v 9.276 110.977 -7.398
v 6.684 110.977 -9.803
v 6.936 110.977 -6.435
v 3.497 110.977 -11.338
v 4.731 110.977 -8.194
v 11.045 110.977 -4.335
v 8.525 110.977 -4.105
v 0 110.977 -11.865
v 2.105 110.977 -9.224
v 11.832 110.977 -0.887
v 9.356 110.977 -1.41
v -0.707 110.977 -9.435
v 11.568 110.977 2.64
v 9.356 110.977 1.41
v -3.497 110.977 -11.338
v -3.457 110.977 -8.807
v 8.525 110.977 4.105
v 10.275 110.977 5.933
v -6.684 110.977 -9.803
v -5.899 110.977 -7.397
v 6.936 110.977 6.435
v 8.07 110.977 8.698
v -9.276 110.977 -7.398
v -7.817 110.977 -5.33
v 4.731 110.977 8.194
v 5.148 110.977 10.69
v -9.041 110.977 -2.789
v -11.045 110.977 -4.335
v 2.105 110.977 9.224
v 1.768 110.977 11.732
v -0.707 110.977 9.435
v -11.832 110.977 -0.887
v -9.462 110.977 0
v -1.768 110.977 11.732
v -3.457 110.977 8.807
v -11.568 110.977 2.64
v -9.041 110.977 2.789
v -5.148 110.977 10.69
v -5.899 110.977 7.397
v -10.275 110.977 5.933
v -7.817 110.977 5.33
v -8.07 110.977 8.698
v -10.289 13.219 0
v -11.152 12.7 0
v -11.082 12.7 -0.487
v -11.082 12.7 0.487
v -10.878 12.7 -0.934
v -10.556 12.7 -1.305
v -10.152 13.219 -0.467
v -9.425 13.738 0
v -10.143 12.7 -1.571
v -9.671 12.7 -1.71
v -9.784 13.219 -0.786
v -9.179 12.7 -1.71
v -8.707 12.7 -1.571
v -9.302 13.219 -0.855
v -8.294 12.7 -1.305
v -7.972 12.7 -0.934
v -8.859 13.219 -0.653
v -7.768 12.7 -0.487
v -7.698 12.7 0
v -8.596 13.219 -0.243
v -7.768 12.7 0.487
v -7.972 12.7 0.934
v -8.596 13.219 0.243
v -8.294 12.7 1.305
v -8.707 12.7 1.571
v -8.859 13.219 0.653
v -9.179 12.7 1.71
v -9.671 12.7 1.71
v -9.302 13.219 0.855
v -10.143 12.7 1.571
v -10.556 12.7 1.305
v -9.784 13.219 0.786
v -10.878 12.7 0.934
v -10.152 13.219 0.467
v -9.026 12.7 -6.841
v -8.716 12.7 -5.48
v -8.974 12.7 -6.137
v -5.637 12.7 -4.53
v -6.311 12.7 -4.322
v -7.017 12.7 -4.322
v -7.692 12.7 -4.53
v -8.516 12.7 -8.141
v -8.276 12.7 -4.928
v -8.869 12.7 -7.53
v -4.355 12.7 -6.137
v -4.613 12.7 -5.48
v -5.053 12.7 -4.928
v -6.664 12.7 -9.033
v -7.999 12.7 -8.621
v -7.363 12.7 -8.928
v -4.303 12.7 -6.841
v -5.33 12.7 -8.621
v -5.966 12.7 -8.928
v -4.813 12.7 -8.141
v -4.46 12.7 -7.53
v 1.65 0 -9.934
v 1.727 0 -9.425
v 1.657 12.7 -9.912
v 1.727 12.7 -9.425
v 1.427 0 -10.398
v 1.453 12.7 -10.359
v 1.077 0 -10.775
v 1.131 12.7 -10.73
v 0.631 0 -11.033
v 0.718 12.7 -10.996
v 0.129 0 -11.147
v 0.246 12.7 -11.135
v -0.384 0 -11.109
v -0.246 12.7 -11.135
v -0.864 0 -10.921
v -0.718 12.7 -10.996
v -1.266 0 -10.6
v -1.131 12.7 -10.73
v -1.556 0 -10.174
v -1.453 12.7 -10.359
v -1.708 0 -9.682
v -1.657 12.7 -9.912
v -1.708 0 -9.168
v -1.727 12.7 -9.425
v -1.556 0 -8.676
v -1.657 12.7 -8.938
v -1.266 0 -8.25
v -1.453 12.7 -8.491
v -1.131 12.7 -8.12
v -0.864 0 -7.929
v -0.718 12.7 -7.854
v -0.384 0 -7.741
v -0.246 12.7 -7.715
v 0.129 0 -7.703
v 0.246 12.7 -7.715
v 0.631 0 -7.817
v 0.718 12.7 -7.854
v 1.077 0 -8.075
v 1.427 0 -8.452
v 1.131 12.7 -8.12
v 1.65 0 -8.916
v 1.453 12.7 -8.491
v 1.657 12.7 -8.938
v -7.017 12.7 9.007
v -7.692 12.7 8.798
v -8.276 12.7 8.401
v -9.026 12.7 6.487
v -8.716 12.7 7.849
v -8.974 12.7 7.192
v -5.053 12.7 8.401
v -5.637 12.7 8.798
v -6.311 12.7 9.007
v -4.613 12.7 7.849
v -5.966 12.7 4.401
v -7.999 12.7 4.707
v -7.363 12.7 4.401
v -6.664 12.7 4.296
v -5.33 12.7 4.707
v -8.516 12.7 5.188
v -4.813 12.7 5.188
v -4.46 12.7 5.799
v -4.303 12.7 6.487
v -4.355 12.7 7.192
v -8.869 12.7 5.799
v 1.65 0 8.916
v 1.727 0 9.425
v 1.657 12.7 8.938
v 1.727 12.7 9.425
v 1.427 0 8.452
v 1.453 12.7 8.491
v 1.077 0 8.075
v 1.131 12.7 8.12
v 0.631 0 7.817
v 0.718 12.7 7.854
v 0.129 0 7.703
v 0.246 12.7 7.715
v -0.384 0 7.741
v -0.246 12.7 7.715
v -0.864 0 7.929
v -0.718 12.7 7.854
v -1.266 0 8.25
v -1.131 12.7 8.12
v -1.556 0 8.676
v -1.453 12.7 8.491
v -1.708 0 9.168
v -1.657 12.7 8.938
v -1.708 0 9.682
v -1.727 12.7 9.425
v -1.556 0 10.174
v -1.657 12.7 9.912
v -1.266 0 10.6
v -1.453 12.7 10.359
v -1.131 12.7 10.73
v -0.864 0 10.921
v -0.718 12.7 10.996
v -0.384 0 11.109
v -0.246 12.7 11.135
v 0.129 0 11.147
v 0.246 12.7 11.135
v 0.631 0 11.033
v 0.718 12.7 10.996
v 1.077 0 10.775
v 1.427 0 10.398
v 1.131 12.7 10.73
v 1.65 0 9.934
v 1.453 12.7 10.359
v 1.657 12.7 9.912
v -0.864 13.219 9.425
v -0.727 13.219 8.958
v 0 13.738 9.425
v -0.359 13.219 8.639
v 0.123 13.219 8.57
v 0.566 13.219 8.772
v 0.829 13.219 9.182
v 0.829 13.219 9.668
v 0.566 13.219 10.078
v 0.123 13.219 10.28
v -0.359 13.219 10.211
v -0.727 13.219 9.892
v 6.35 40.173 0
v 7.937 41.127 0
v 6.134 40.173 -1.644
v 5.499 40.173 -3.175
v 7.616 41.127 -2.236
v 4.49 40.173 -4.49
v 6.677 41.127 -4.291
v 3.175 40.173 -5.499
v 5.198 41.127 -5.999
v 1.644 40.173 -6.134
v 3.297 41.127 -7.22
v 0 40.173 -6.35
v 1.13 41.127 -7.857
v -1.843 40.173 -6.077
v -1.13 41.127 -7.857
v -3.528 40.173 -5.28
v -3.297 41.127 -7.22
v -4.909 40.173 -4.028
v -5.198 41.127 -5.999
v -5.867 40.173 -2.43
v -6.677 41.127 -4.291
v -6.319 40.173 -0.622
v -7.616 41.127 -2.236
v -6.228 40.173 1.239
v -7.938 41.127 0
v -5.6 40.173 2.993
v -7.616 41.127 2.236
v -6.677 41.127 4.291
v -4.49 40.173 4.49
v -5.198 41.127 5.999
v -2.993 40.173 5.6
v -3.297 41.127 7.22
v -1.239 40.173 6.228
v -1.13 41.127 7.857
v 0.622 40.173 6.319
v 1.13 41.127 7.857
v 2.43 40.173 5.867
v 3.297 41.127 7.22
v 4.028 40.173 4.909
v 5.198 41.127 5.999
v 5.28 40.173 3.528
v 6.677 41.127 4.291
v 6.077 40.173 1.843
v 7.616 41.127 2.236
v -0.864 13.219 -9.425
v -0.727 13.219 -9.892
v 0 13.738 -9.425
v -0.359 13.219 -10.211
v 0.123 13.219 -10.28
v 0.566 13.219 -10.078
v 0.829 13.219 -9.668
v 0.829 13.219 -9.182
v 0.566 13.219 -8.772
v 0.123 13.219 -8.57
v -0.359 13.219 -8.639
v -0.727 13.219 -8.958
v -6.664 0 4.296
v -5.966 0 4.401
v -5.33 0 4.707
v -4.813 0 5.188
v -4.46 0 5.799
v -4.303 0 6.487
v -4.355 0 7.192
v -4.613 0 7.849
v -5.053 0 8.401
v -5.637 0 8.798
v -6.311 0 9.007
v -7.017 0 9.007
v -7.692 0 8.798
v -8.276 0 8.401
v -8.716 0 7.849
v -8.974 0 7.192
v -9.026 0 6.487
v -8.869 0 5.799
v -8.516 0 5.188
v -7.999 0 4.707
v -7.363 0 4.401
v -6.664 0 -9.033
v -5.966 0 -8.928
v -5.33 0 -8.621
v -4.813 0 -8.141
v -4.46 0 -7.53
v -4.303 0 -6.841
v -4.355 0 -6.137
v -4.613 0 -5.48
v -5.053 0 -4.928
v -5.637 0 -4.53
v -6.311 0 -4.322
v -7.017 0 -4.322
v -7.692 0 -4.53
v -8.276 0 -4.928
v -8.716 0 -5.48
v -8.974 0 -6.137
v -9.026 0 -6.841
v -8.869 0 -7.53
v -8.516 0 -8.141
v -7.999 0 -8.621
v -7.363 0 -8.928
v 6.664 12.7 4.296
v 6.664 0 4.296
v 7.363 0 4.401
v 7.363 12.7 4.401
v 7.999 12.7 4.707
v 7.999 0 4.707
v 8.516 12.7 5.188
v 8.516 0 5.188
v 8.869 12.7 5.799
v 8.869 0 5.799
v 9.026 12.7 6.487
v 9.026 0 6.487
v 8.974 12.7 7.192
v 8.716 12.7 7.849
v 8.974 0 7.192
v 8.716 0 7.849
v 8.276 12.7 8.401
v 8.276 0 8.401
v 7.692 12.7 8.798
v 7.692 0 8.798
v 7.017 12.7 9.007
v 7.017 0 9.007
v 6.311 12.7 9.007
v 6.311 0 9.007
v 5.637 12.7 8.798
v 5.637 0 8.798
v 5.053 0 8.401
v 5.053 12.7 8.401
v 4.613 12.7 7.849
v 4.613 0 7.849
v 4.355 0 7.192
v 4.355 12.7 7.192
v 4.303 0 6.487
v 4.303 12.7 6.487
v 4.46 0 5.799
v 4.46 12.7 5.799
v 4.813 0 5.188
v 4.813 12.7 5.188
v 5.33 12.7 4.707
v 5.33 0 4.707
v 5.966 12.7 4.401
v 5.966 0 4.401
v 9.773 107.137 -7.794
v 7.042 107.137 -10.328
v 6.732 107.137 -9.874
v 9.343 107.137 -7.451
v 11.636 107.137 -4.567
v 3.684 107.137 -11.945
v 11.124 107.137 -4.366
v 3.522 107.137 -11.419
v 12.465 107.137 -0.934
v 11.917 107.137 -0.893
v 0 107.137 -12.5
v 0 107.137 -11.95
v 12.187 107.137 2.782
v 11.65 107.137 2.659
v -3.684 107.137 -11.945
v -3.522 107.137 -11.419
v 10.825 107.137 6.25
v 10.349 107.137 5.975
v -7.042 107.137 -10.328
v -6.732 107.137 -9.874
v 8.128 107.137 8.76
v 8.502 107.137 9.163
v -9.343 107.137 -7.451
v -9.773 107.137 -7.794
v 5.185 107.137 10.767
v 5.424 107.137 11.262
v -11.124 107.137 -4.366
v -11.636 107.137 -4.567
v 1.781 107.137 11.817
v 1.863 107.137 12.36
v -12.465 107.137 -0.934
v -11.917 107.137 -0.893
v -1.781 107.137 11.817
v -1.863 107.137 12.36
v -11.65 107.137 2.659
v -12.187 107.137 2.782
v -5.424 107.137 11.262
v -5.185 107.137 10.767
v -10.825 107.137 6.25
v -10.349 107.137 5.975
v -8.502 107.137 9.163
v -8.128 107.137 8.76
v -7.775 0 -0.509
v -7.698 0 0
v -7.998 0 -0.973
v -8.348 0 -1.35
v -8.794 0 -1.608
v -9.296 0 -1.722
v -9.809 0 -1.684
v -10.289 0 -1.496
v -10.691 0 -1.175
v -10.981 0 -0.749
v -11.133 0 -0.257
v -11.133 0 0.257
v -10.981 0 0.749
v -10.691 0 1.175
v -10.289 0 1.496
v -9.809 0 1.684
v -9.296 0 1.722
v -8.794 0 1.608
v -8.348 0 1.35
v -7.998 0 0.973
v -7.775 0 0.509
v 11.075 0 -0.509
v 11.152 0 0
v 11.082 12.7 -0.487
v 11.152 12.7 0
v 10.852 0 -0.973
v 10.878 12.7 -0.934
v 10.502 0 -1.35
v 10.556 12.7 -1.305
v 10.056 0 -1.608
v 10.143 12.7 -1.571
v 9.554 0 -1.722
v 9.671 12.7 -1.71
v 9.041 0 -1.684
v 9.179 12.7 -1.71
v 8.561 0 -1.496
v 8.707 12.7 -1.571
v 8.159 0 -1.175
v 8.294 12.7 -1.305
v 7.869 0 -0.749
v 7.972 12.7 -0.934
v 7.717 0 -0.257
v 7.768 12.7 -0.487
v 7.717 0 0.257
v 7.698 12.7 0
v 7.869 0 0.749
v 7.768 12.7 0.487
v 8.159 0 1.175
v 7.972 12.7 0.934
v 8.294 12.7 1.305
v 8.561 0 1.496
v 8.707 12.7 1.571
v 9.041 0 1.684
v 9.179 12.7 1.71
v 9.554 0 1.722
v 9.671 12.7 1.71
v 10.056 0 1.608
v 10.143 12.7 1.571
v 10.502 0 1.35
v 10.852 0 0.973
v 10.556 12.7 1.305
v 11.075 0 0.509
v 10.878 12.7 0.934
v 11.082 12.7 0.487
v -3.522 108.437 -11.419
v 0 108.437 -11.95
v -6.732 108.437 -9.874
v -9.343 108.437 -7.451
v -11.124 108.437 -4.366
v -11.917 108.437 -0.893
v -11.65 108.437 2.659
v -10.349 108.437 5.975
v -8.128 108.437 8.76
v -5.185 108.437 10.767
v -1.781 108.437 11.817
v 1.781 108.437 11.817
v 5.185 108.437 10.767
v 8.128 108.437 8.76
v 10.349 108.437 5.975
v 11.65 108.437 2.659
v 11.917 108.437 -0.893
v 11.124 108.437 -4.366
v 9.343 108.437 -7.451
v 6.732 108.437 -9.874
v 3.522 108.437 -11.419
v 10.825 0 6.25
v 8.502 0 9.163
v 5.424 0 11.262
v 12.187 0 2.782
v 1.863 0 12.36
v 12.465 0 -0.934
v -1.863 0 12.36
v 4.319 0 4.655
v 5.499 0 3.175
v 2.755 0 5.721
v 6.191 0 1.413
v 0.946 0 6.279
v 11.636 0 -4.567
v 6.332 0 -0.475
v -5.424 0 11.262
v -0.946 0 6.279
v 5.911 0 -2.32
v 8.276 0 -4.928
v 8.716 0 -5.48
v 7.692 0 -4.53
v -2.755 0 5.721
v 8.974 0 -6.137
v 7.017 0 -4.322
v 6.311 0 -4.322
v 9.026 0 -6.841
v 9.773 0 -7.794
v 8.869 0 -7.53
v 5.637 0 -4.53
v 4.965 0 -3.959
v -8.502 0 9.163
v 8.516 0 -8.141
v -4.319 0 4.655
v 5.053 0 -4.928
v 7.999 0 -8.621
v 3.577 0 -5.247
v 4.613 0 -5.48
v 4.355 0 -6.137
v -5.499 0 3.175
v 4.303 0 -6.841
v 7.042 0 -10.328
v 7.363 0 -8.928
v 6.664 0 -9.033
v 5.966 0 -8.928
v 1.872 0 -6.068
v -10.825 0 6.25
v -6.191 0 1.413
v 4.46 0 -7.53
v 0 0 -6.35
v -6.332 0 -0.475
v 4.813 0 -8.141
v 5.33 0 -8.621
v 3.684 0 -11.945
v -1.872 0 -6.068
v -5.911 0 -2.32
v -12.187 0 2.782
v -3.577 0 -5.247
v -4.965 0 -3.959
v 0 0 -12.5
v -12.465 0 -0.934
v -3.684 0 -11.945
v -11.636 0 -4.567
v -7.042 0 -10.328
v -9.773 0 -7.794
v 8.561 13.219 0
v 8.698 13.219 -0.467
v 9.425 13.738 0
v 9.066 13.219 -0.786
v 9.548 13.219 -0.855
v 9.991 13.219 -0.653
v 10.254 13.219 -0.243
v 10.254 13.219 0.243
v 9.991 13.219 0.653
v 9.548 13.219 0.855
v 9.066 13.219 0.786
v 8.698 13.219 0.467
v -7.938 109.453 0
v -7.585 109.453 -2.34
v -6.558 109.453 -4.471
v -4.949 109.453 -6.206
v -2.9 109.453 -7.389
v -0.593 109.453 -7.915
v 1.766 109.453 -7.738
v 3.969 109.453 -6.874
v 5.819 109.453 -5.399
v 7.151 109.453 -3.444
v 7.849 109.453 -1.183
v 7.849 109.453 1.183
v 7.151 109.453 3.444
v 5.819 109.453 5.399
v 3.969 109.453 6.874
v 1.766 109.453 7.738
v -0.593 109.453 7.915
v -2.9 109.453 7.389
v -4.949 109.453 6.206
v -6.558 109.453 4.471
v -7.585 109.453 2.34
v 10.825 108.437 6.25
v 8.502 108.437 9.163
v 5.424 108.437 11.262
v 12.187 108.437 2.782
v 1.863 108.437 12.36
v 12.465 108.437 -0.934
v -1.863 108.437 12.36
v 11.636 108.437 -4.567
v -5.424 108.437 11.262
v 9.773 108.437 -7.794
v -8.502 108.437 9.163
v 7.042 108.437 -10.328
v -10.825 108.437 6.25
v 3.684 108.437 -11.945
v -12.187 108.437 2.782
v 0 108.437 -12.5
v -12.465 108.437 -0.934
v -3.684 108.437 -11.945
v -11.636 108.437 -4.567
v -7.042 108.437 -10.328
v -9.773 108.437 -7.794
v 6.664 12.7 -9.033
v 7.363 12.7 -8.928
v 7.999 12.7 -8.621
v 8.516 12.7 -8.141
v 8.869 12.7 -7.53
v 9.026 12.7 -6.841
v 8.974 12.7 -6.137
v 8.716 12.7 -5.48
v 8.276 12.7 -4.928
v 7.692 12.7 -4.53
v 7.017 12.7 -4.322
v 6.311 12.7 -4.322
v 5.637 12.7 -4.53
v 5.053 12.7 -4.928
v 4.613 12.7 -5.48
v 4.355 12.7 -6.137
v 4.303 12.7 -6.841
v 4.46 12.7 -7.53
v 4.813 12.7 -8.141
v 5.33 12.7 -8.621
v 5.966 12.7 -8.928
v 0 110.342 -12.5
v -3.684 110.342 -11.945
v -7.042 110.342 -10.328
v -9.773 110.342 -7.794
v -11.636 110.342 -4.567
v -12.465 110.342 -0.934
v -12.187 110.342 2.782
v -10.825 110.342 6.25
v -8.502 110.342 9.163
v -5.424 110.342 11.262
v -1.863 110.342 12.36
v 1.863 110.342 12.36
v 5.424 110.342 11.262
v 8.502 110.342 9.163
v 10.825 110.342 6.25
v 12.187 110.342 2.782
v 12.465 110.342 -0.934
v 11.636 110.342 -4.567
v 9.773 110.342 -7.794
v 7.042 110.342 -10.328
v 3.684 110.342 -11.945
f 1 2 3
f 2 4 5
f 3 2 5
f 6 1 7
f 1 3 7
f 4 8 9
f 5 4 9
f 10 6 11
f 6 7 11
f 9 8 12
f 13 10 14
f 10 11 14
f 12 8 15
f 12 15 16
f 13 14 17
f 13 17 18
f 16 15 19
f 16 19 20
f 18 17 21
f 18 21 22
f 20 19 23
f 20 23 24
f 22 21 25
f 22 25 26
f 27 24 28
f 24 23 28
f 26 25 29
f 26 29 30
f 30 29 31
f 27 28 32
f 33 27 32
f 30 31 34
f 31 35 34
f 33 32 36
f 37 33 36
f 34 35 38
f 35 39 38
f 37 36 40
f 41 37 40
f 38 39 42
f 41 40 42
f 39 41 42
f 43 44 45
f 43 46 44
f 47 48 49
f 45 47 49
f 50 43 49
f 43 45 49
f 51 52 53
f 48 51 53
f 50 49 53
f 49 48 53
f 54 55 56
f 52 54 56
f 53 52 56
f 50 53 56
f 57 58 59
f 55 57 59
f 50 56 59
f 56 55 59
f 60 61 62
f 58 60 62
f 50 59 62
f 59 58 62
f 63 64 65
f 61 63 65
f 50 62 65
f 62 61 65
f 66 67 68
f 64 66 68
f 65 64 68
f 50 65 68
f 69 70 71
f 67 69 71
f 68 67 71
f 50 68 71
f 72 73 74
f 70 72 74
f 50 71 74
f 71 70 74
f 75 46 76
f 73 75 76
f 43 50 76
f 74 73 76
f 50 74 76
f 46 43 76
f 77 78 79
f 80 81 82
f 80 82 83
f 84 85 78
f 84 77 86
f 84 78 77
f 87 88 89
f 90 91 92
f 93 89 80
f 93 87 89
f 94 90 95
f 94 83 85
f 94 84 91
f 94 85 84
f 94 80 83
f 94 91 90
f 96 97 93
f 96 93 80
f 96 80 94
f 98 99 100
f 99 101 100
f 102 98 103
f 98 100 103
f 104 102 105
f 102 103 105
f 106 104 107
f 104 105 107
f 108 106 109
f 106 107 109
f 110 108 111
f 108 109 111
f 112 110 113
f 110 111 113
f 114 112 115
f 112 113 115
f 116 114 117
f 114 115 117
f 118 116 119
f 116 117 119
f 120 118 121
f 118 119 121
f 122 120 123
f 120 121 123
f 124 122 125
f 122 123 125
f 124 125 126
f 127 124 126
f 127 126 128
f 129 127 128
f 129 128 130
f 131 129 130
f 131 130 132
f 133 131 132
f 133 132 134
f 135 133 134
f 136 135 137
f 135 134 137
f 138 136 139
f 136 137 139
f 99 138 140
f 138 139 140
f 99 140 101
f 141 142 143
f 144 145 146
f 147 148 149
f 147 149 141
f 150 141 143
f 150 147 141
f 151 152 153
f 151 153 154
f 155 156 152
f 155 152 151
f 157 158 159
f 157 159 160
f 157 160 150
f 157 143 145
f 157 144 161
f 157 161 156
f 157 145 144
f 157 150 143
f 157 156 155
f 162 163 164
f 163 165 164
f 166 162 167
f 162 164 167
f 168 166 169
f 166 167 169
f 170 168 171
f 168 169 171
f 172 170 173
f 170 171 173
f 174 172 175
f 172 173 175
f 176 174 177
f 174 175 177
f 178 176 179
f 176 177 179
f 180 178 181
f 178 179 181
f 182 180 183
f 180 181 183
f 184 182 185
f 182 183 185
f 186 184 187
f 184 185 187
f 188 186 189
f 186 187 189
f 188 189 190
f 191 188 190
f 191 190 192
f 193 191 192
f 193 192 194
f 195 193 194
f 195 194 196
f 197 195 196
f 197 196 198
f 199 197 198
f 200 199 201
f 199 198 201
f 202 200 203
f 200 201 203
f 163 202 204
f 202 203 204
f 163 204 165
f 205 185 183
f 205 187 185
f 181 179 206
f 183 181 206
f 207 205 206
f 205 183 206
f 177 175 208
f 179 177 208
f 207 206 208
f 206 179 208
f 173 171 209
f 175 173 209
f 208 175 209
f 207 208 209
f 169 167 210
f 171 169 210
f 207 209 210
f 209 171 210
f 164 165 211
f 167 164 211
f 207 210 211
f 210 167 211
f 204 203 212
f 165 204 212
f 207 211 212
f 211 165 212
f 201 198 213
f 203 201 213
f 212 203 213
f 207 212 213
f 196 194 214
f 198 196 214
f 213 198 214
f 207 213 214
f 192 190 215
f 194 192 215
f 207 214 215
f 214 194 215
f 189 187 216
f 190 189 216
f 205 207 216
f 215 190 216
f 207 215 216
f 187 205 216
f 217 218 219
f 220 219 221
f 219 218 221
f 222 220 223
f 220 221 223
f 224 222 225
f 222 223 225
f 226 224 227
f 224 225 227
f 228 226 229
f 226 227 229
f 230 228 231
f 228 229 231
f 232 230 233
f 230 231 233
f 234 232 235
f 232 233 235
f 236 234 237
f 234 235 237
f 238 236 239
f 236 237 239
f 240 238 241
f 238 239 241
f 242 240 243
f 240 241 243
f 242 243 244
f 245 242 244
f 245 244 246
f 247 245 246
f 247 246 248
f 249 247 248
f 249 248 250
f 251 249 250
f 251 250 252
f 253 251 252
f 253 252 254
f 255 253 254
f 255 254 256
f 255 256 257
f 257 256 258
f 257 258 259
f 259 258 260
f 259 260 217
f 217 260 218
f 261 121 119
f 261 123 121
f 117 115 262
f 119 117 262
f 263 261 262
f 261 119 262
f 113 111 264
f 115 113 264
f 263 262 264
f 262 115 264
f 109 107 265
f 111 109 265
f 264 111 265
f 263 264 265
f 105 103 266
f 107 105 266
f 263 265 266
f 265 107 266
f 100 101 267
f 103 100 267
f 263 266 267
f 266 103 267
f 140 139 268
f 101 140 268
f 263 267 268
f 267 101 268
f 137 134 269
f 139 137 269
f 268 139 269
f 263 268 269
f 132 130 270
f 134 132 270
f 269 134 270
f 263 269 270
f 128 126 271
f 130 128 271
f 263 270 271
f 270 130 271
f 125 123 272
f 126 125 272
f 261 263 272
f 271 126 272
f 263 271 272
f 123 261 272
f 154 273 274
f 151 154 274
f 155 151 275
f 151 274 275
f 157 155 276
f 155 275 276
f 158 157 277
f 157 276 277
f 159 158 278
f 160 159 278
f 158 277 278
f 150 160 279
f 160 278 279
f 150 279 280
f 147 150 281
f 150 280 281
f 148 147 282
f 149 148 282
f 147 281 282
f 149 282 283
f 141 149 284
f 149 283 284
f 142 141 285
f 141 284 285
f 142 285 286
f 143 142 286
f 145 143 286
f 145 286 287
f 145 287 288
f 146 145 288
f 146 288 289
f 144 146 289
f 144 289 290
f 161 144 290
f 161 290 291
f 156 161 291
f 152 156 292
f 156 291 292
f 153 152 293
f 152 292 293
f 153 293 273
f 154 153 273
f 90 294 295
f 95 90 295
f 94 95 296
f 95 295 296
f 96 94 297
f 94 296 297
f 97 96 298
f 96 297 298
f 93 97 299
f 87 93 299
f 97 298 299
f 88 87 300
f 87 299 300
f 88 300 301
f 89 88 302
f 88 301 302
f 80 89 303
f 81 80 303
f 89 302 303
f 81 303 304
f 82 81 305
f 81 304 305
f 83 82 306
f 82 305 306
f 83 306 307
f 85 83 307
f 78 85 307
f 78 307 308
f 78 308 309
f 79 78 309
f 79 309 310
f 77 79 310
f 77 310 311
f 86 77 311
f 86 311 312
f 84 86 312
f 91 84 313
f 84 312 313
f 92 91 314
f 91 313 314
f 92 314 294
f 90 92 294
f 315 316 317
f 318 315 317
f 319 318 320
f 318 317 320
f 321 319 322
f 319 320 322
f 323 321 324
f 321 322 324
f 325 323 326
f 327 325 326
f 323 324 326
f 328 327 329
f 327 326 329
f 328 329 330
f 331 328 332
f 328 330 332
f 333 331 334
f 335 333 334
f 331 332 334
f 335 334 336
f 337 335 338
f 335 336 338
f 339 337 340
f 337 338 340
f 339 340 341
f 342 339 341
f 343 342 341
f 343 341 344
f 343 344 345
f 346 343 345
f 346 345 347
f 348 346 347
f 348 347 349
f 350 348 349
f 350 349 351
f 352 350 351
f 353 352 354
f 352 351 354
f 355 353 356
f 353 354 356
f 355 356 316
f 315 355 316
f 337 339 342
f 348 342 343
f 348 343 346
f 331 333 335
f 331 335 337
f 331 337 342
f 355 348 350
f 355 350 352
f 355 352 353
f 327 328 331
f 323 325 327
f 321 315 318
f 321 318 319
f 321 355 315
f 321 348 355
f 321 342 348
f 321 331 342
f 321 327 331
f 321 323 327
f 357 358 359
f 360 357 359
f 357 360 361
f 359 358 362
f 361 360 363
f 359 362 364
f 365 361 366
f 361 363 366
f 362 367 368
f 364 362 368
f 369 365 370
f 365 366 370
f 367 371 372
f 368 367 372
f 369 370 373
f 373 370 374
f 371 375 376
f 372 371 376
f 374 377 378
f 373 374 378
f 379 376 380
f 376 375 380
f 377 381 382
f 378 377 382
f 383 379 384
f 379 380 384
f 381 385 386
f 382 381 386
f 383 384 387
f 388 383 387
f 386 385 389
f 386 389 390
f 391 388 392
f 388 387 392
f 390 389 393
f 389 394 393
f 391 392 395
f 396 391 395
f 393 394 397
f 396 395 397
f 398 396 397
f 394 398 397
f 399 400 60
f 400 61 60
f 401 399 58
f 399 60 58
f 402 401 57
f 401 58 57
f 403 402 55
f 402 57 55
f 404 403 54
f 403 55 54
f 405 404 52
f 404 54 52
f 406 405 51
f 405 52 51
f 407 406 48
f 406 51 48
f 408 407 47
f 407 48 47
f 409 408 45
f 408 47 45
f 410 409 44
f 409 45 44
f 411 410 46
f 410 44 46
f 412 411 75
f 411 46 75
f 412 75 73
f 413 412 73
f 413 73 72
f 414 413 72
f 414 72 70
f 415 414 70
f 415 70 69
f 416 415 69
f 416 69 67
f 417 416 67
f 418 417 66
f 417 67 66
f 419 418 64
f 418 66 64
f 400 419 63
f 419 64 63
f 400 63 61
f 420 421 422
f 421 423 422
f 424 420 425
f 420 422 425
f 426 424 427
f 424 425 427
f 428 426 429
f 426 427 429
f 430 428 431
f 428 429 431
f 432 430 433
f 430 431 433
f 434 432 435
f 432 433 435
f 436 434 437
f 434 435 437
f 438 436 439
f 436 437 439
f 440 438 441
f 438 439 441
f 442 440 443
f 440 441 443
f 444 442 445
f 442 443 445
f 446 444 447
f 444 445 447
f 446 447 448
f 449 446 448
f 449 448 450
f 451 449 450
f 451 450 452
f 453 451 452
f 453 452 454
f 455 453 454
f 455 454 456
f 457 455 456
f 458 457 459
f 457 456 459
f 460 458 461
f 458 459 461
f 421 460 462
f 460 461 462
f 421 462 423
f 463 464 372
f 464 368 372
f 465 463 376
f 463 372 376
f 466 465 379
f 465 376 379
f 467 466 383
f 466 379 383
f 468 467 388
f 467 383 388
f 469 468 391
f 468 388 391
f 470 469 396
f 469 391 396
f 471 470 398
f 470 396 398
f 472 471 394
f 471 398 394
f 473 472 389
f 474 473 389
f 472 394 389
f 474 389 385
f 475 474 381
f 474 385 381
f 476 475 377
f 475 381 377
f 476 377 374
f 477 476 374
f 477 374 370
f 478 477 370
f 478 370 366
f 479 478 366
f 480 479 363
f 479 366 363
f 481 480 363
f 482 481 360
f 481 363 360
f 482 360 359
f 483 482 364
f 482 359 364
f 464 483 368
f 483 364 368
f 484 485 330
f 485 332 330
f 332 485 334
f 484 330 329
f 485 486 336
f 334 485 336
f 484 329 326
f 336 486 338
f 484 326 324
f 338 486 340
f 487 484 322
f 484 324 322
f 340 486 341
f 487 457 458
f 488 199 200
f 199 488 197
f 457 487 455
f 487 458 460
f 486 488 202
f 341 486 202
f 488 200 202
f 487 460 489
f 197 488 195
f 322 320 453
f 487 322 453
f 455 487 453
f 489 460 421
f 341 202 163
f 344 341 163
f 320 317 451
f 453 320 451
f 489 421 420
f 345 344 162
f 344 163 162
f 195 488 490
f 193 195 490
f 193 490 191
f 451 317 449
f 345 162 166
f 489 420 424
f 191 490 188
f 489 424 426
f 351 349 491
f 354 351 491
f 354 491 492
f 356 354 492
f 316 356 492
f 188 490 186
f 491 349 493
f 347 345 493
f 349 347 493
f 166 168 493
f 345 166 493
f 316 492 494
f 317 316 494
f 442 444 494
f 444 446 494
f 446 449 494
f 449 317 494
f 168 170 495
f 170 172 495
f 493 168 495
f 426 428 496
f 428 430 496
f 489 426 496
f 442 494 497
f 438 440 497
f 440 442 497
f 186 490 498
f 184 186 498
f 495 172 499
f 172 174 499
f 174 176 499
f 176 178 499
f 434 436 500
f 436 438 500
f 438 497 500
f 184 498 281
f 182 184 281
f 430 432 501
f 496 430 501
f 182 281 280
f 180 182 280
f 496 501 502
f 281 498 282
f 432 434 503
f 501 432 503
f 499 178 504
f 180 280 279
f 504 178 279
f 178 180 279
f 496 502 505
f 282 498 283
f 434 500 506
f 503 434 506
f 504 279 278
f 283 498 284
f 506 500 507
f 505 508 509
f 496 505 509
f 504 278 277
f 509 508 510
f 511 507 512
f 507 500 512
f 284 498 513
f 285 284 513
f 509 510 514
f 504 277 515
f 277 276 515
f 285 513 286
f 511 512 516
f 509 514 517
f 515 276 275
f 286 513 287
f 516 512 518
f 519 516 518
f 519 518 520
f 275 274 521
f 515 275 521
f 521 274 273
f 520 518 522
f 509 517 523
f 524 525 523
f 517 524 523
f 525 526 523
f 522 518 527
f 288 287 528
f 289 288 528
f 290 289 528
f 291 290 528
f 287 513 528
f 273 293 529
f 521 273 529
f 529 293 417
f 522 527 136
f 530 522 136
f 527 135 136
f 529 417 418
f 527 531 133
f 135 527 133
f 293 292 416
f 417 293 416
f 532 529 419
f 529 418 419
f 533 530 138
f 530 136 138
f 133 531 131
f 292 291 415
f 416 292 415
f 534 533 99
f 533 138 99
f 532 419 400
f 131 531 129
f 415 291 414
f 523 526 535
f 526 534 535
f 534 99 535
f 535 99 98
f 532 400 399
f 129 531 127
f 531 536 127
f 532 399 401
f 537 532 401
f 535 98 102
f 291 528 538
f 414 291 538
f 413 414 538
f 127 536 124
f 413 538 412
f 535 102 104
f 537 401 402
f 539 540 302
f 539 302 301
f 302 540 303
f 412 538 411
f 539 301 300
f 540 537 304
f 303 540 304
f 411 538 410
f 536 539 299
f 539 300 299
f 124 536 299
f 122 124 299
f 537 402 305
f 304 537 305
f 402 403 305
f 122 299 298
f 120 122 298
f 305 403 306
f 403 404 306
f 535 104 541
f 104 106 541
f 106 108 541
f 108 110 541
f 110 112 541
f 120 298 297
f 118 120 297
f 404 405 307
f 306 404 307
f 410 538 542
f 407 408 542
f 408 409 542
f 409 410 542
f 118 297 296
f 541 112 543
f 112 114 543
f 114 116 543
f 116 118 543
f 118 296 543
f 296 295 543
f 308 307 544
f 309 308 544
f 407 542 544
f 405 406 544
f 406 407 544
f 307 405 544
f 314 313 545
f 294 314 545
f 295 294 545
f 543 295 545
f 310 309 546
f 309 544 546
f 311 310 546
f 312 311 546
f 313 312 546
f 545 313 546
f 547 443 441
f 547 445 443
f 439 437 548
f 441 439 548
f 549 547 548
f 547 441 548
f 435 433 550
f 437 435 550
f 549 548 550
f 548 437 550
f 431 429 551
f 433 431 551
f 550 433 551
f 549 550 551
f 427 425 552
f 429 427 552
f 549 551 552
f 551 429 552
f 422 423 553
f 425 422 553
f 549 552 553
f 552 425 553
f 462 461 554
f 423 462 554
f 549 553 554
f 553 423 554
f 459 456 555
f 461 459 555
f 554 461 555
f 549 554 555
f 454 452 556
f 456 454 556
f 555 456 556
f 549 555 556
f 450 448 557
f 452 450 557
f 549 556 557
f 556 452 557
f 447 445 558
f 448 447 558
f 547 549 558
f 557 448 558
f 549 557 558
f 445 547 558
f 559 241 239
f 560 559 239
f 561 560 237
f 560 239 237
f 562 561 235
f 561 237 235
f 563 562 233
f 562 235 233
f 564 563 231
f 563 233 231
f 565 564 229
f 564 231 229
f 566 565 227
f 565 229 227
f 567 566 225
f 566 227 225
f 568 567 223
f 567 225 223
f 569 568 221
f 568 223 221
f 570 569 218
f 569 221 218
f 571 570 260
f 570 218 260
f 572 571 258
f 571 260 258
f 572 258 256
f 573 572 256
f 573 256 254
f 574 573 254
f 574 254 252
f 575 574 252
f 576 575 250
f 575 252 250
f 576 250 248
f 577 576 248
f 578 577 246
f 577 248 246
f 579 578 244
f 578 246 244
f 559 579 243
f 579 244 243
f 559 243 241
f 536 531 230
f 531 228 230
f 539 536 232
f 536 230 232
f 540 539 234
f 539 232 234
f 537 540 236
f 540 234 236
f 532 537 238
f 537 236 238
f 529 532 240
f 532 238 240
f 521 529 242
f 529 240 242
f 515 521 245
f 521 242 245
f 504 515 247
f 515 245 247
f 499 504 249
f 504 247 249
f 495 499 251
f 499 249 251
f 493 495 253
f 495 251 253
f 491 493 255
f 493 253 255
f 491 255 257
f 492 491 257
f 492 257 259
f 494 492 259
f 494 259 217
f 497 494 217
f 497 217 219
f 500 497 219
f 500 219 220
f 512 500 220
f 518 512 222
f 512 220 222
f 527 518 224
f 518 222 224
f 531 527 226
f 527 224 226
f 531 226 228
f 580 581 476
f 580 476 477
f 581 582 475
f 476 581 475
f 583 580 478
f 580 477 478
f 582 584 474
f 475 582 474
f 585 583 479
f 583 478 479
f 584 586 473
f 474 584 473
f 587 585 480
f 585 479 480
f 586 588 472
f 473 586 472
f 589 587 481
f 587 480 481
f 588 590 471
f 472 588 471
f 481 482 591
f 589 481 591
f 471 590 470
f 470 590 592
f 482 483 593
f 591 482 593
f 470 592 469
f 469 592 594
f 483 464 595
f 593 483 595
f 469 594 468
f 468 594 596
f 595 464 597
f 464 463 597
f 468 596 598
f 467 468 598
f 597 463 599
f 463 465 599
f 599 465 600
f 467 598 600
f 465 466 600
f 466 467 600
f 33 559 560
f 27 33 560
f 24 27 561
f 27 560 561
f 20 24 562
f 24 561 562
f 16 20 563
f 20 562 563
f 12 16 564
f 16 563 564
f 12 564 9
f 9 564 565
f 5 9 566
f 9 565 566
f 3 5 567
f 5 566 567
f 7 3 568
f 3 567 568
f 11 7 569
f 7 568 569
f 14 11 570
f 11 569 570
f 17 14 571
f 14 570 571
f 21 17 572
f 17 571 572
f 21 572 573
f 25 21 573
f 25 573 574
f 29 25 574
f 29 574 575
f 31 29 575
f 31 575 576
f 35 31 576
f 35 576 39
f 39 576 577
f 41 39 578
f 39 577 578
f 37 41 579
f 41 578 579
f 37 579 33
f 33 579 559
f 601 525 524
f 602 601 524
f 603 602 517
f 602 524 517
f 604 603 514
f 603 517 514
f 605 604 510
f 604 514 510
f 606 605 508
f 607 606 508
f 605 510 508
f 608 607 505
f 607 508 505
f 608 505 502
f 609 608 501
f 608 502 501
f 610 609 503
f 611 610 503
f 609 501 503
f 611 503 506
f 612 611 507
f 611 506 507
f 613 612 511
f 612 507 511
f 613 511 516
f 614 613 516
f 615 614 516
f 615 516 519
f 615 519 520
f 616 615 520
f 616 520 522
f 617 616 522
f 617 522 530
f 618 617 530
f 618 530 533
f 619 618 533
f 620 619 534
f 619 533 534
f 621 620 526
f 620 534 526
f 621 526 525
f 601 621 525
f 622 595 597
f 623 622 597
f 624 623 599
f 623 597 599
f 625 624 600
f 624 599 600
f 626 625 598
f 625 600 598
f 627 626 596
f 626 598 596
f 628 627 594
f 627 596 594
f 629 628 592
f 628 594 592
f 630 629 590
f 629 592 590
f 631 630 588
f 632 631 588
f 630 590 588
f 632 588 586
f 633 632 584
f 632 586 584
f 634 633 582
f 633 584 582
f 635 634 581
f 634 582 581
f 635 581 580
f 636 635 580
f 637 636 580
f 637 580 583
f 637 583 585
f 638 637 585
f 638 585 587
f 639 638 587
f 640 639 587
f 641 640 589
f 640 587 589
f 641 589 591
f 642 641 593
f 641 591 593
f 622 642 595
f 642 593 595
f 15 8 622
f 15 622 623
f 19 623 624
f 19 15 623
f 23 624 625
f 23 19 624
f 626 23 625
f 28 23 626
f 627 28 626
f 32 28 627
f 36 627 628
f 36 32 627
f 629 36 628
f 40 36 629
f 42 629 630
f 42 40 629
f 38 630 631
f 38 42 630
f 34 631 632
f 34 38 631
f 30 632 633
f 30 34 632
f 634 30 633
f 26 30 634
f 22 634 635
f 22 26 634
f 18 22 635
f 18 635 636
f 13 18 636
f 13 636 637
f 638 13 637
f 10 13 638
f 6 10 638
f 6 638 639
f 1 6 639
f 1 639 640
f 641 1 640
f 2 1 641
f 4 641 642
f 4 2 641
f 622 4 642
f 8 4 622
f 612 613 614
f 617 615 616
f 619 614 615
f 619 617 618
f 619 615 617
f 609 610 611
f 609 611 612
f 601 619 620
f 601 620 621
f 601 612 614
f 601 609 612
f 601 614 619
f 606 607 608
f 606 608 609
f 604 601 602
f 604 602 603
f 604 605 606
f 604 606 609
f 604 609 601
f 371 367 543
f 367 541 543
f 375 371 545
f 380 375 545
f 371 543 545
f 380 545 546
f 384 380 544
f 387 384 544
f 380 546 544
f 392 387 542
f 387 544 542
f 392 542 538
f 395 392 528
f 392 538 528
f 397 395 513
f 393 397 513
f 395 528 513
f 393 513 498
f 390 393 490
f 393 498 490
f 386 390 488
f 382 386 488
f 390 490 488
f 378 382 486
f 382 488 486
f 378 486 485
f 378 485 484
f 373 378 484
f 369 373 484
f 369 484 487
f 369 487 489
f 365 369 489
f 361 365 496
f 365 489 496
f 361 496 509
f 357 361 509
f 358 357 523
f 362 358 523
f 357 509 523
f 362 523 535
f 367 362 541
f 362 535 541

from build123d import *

# Parameters (mm, degrees)
F_5_8_0_625_DIAMETER_HOLE1_D     = 15.875
F_5_8_0_625_DIAMETER_HOLE1_DEPTH = 69.85
F_5_8_0_625_DIAMETER_HOLE1_TIP   = 4.769331164
CHAMFER1_SIZE                    = 0.635
F_8_32_TAPPED_HOLE1_D            = 3.4544
F_8_32_TAPPED_HOLE1_DEPTH        = 12.7
F_8_32_TAPPED_HOLE1_TIP          = 1.037806461
SKETCH8_R                        = 2.368549992
SKETCH8_R_2                      = 2.368549996
SKETCH8_R_3                      = 2.368550008
SKETCH8_R_4                      = 2.368550004
CUT_EXTRUDE1_DEPTH               = 12.7
CHAMFER2_SIZE                    = 1.524


with BuildPart() as part:
    # Sketch1 → Revolve1 (revolve)
    with BuildSketch(Plane(origin=(0, 0, 0), x_dir=(0, 0, -1), z_dir=(1, 0, 0))):
        Polygon((12.500000019, 108.43719994), (11.949999976, 108.43719994), (11.949999976, 107.1372), (12.500000019, 107.1372), (12.500000019, 0), (6.35, 0), (6.35, 110.97719994), (12.500000019, 110.97719994), align=None)
    revolve(axis=Axis((0, 0, 0), (0, 1, 0)))

    # 5/8 (0.625) Diameter Hole1
    with Locations(Plane(origin=(0, 110.97719994, 0), x_dir=(1, 0, 0), z_dir=(0, 1, 0))):
        with Locations((0, 0)):
            Hole(F_5_8_0_625_DIAMETER_HOLE1_D / 2, depth=F_5_8_0_625_DIAMETER_HOLE1_DEPTH)
            with Locations((0, 0, -(F_5_8_0_625_DIAMETER_HOLE1_DEPTH + F_5_8_0_625_DIAMETER_HOLE1_TIP / 2))):  # 118° drill point
                Cone(0, F_5_8_0_625_DIAMETER_HOLE1_D / 2, F_5_8_0_625_DIAMETER_HOLE1_TIP, mode=Mode.SUBTRACT)

    # Chamfer1
    chamfer1_edges = [part.edges().sort_by_distance(p)[0] for p in [
        (0, 110.97719994, 12.500000019),
    ]]
    chamfer(chamfer1_edges, length=CHAMFER1_SIZE)

    # #8-32 Tapped Hole1
    with Locations(Plane(origin=(0, 0, 0), x_dir=(-1, 0, 0), z_dir=(0, -1, 0))):
        with Locations((9.42500001, 0), (0, -9.42500001), (-9.42500001, 0), (0, 9.42500001)):
            Hole(F_8_32_TAPPED_HOLE1_D / 2, depth=F_8_32_TAPPED_HOLE1_DEPTH)
            with Locations((0, 0, -(F_8_32_TAPPED_HOLE1_DEPTH + F_8_32_TAPPED_HOLE1_TIP / 2))):  # 118° drill point
                Cone(0, F_8_32_TAPPED_HOLE1_D / 2, F_8_32_TAPPED_HOLE1_TIP, mode=Mode.SUBTRACT)

    # Sketch8 → Cut-Extrude1 (cut)
    with BuildSketch(Plane.XZ):
        with Locations(Location((6.664481419, 6.664481419, 0), (0, 0, 270))):
            Circle(SKETCH8_R)
        with Locations(Location((6.664481419, -6.664481419, 0), (0, 0, 270))):
            Circle(SKETCH8_R_2)
        with Locations(Location((-6.664481419, -6.664481419, 0), (0, 0, 270))):
            Circle(SKETCH8_R_3)
        with Locations(Location((-6.664481419, 6.664481419, 0), (0, 0, 270))):
            Circle(SKETCH8_R_4)
    extrude(amount=-CUT_EXTRUDE1_DEPTH, mode=Mode.SUBTRACT)

    # Chamfer2
    chamfer2_edges = [part.edges().sort_by_distance(p)[0] for p in [
        (7.9375, 110.97719994, 0),
    ]]
    chamfer(chamfer2_edges, length=CHAMFER2_SIZE)


solid = part.part
